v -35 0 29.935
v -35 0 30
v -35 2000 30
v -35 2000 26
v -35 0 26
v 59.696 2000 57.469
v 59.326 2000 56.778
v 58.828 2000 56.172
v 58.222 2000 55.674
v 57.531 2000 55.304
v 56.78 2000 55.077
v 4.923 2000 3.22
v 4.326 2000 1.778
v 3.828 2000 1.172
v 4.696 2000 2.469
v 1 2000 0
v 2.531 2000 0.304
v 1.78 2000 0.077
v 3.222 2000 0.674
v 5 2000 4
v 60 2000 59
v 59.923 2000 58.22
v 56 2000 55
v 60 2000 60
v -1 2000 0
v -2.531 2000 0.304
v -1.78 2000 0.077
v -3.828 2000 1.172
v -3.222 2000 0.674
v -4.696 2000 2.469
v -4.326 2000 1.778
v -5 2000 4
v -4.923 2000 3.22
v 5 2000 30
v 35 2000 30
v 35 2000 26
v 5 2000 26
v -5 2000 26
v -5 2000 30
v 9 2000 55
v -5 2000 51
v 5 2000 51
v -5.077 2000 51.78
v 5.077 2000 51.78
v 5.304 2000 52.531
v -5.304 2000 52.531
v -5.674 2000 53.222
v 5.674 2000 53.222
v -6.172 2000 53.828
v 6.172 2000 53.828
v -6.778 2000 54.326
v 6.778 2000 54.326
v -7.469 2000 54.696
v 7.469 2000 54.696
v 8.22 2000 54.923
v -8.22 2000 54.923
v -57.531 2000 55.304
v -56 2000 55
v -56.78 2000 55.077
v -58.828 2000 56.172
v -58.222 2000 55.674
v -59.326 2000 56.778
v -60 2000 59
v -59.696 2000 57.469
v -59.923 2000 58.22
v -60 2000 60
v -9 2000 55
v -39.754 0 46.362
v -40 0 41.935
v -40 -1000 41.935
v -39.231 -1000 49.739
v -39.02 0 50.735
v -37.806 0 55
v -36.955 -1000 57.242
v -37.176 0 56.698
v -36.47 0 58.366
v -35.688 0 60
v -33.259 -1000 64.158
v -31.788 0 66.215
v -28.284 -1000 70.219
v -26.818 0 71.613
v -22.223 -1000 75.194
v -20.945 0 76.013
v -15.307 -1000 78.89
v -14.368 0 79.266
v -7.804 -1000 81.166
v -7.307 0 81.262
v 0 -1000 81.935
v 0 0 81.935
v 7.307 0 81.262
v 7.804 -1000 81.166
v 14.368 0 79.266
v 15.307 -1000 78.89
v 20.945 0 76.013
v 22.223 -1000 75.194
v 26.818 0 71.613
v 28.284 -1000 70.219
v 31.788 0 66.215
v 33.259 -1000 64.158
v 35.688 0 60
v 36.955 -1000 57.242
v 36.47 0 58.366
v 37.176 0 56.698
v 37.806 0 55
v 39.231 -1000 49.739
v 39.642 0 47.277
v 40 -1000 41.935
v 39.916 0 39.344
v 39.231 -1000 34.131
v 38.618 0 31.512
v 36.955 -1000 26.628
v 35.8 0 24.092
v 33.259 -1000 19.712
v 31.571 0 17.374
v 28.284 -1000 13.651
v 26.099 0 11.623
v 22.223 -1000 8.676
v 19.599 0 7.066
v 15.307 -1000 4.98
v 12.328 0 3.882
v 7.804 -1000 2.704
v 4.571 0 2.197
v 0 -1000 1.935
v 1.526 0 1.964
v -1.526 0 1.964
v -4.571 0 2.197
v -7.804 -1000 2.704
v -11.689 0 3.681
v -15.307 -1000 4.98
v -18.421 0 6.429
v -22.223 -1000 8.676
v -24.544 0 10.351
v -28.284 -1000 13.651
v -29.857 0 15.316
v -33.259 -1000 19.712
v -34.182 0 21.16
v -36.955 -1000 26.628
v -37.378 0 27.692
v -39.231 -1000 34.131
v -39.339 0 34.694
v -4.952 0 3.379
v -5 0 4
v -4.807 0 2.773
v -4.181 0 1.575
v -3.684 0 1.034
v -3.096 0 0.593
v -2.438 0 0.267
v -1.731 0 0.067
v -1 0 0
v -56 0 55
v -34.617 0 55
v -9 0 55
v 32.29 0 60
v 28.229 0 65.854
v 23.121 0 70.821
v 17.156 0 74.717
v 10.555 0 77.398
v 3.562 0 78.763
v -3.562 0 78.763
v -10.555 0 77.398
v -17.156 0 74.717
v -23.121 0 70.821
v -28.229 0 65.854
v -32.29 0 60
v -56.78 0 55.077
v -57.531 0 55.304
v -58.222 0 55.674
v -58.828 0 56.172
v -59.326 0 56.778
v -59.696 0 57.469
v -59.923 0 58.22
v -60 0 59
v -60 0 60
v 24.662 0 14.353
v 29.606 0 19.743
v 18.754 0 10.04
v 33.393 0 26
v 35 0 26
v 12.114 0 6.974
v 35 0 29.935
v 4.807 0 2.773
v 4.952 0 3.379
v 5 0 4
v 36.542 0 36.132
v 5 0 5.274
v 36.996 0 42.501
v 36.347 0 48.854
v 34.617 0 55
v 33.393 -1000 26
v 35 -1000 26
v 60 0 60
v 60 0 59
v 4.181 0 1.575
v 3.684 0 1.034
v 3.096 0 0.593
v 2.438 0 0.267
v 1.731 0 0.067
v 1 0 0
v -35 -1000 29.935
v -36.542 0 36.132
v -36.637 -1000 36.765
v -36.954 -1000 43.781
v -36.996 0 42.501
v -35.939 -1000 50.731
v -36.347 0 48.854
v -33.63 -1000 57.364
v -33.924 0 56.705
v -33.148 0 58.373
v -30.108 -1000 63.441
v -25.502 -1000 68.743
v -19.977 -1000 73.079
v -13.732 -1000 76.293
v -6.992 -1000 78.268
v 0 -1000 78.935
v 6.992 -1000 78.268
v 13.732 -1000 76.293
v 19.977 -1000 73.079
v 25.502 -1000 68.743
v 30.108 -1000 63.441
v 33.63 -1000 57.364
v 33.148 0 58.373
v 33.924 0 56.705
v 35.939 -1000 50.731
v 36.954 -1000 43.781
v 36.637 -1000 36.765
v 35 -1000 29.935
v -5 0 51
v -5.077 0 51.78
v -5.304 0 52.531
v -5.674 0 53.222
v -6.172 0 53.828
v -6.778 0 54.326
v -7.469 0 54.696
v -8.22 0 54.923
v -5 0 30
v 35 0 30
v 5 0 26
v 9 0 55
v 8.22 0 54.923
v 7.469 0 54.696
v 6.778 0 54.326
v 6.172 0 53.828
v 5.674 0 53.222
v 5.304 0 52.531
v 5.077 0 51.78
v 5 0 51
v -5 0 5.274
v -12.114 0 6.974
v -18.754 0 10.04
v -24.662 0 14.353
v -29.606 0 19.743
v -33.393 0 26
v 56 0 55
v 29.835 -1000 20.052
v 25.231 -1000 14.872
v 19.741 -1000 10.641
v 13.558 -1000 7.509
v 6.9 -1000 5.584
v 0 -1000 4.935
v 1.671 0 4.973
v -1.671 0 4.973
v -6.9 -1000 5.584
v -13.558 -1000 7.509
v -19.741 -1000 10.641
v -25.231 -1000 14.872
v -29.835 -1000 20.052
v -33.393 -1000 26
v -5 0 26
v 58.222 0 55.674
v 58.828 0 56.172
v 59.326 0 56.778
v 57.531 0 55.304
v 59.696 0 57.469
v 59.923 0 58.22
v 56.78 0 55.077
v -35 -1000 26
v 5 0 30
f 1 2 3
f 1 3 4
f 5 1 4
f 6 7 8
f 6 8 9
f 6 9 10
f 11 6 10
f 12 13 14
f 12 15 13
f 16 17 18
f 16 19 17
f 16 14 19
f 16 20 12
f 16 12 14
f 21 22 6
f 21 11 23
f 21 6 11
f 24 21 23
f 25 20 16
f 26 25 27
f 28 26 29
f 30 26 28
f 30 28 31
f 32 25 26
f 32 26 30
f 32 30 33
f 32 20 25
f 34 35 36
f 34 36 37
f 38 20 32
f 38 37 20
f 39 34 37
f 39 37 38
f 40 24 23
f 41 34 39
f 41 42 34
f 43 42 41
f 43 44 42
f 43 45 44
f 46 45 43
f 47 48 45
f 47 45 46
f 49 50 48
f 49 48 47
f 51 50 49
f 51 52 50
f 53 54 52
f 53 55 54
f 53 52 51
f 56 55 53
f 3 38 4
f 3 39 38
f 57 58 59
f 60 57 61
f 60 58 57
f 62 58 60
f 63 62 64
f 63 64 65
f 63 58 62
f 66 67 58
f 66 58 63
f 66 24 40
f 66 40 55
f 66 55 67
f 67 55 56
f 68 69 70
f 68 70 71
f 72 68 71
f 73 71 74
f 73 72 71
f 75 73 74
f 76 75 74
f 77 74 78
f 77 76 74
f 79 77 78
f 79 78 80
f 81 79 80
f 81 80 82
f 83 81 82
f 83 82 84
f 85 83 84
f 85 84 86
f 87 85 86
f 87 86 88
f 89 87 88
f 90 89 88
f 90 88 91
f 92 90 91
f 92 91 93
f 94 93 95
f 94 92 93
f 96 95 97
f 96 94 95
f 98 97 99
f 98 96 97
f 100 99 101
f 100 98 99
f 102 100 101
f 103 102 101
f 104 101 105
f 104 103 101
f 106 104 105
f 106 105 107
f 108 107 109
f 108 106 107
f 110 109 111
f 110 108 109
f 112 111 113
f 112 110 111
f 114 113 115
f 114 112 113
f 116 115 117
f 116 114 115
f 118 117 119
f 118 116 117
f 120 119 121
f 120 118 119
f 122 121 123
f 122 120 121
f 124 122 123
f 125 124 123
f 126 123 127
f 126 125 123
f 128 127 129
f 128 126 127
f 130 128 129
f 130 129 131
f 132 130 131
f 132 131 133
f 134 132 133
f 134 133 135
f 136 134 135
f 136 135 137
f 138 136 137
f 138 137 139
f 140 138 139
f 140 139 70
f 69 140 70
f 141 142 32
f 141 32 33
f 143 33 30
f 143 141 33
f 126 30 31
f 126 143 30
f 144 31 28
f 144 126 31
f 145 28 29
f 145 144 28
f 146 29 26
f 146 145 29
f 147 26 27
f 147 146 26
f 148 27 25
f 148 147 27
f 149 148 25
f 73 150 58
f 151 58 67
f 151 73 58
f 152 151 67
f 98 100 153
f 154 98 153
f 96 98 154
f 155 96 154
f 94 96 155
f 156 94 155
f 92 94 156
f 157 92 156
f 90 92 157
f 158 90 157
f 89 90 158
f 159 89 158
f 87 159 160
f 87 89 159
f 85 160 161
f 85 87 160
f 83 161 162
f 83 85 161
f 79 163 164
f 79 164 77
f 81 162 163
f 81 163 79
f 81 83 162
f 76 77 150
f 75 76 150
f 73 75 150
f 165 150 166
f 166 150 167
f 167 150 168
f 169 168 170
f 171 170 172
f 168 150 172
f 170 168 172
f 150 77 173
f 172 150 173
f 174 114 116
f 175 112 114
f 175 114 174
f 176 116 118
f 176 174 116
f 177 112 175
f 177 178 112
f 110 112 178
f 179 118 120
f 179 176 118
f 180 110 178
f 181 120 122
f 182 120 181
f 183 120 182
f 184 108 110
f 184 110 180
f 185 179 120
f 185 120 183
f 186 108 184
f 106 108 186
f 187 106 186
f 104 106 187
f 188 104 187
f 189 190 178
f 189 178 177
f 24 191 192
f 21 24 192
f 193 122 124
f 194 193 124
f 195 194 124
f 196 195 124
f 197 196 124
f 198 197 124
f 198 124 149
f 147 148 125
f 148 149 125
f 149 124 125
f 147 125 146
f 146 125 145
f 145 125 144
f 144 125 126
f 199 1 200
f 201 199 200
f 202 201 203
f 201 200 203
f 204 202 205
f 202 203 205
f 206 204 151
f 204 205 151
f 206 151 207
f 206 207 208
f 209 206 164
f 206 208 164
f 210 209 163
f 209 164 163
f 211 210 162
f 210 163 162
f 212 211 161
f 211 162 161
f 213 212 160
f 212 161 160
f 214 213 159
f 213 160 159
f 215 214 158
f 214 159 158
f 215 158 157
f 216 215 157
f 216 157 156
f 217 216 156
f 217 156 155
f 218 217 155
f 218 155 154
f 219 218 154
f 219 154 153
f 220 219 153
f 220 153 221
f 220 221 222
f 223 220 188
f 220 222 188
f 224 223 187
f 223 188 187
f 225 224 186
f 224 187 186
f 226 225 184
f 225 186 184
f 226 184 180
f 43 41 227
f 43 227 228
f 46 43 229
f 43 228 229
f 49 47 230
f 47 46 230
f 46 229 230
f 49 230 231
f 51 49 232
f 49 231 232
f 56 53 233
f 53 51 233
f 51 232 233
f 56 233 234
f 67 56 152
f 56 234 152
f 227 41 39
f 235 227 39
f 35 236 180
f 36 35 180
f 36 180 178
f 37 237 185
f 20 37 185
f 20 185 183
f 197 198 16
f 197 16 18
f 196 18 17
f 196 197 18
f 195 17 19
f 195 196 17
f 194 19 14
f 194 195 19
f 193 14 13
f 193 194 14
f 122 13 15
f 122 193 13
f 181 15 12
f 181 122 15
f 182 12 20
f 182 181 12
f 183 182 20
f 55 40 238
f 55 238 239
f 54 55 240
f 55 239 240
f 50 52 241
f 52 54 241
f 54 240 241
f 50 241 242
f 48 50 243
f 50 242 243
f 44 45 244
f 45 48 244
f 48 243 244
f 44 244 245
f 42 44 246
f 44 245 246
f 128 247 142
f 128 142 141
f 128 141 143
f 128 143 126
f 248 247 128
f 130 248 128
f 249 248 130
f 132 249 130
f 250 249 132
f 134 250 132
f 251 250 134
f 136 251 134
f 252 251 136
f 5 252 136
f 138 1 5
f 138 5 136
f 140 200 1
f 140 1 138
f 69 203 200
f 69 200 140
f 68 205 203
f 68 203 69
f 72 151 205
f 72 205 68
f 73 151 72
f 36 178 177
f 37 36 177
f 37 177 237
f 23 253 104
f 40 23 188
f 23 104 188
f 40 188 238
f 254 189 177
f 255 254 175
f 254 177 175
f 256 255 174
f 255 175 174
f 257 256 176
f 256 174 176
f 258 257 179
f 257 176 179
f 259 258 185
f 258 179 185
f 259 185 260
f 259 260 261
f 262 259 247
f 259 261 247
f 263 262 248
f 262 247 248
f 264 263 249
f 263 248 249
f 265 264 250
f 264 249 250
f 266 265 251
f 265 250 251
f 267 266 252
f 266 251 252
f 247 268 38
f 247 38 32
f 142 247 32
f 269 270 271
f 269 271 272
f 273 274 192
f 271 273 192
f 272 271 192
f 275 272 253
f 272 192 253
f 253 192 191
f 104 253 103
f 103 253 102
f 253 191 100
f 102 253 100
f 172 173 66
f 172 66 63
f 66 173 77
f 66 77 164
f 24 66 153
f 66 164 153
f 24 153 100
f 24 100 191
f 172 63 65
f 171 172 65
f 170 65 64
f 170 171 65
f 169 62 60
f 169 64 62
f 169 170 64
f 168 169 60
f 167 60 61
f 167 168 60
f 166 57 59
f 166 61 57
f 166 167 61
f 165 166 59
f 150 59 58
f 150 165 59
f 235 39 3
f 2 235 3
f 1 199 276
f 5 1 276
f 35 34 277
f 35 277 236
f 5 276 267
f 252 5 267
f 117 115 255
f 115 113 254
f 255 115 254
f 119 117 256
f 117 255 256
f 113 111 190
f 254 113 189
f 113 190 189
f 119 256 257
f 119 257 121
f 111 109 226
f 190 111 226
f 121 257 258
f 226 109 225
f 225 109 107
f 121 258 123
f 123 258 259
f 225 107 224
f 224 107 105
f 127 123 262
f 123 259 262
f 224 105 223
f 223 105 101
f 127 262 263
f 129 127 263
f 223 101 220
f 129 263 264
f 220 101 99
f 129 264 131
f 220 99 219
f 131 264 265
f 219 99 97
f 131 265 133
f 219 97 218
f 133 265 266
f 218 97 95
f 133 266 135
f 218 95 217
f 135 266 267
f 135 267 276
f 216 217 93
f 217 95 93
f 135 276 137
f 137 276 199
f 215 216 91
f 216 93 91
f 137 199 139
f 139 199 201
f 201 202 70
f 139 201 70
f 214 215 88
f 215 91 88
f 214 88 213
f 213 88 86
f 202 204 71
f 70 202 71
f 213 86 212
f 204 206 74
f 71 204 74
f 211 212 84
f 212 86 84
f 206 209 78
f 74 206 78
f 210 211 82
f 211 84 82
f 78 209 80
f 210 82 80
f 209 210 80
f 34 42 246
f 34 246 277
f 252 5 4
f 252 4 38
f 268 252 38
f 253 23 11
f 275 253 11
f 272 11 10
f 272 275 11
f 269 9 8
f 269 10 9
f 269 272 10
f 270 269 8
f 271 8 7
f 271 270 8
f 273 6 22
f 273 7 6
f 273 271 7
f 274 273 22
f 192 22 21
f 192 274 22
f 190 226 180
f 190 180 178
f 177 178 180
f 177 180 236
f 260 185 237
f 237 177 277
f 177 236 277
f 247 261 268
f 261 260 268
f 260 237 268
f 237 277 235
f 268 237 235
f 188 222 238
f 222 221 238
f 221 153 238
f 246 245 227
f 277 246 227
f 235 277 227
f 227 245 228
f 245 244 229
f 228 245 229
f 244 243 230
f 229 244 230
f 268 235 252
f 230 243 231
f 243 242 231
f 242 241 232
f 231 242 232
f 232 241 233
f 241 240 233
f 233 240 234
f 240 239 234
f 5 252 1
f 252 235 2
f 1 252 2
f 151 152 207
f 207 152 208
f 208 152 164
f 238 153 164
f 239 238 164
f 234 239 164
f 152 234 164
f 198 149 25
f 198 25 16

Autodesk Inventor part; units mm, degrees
ref_plane "YZ Plane" through (0, 0, 0) normal (1, 0, 0) x (0, 1, 0)
ref_plane "XZ Plane" through (0, 0, 0) normal (0, 1, 0) x (-1, 0, 0)
ref_plane "XY Plane" through (0, 0, 0) normal (0, 0, 1) x (1, 0, 0)
sketch "Sketch1" plane through (0, 0, 0) normal (0, 1, 0) x (-1, 0, 0)
  line L0 (0, 0) -> (0, 60)
  line L1 (0, 60) -> (60, 60)
  line L2 (56, 55) -> (9, 55)
  line L3 (5, 51) -> (5, 4)
  line L4 (60, 60) -> (60, 59)
  line L5 (0, 0) -> (1, 0)
  arc A0 (1, 0) -> (5, 4) centre (1, 4) ccw
  arc A1 (56, 55) -> (60, 59) centre (56, 59) ccw
  arc A2 (9, 55) -> (5, 51) centre (9, 51) ccw
  line L6 (5, 30) -> (35, 30)
  line L7 (35, 30) -> (35, 26)
  line L8 (35, 26) -> (5, 26)
  line L9 (0, 60) -> (-60, 60)
  line L10 (-56, 55) -> (-9, 55)
  line L11 (-5, 51) -> (-5, 4)
  line L12 (-60, 60) -> (-60, 59)
  line L13 (0, 0) -> (-1, 0)
  arc A3 (-5, 4) -> (-1, 0) centre (-1, 4) ccw
  arc A4 (-60, 59) -> (-56, 55) centre (-56, 59) ccw
  arc A5 (-5, 51) -> (-9, 55) centre (-9, 51) ccw
  line L14 (-5, 30) -> (-35, 30)
  line L15 (-35, 30) -> (-35, 26)
  line L16 (-35, 26) -> (-5, 26)
  circle A6 centre (0, 41.935) radius 40
  circle A7 centre (0, 41.935) radius 37
  dimension "d0" = 60
  dimension "d1" = 60
  dimension "d2" = 5
  dimension "d3" = 4
  dimension "d4" = 30
  dimension "d5" = 4
  dimension "d6" = 25
  dimension "d9" = 80
  dimension "d10" = 3
extrude "Extrusion1" add sketch "Sketch1" along normal blind 2000 contours L13 A3 A6 L0 | L0 A6 A0 L5 | A6 A3 L11 A7 L0 | L0 A7 L3 A0 A6 | A7 L11 A5 L10 L9 L0 | L0 L1 A7 L2 A2 L3 | A6 L9 A7 L10 | L10 A4 L12 L9 A6 | L1 A6 L2 A7 | L16 A7 L15 L14 L11 | L16 L15 A7 | L3 L6 L7 A7 L8 | A7 L7 L8 | A6 L1 L4 A1 L2
extrude "Extrusion2" add sketch "Sketch1" against normal blind 1000 contours A6 A3 L11 A7 L0 | L0 A7 L3 A0 A6 | A6 L10 A7 L15 L16 L11 A3 | A0 L3 A7 L8 L7 L2 A6 | A6 L9 A7 L10 | A7 L9 A6 L1 | L1 A6 L2 A7
properties part number "L60x2profilSas"
